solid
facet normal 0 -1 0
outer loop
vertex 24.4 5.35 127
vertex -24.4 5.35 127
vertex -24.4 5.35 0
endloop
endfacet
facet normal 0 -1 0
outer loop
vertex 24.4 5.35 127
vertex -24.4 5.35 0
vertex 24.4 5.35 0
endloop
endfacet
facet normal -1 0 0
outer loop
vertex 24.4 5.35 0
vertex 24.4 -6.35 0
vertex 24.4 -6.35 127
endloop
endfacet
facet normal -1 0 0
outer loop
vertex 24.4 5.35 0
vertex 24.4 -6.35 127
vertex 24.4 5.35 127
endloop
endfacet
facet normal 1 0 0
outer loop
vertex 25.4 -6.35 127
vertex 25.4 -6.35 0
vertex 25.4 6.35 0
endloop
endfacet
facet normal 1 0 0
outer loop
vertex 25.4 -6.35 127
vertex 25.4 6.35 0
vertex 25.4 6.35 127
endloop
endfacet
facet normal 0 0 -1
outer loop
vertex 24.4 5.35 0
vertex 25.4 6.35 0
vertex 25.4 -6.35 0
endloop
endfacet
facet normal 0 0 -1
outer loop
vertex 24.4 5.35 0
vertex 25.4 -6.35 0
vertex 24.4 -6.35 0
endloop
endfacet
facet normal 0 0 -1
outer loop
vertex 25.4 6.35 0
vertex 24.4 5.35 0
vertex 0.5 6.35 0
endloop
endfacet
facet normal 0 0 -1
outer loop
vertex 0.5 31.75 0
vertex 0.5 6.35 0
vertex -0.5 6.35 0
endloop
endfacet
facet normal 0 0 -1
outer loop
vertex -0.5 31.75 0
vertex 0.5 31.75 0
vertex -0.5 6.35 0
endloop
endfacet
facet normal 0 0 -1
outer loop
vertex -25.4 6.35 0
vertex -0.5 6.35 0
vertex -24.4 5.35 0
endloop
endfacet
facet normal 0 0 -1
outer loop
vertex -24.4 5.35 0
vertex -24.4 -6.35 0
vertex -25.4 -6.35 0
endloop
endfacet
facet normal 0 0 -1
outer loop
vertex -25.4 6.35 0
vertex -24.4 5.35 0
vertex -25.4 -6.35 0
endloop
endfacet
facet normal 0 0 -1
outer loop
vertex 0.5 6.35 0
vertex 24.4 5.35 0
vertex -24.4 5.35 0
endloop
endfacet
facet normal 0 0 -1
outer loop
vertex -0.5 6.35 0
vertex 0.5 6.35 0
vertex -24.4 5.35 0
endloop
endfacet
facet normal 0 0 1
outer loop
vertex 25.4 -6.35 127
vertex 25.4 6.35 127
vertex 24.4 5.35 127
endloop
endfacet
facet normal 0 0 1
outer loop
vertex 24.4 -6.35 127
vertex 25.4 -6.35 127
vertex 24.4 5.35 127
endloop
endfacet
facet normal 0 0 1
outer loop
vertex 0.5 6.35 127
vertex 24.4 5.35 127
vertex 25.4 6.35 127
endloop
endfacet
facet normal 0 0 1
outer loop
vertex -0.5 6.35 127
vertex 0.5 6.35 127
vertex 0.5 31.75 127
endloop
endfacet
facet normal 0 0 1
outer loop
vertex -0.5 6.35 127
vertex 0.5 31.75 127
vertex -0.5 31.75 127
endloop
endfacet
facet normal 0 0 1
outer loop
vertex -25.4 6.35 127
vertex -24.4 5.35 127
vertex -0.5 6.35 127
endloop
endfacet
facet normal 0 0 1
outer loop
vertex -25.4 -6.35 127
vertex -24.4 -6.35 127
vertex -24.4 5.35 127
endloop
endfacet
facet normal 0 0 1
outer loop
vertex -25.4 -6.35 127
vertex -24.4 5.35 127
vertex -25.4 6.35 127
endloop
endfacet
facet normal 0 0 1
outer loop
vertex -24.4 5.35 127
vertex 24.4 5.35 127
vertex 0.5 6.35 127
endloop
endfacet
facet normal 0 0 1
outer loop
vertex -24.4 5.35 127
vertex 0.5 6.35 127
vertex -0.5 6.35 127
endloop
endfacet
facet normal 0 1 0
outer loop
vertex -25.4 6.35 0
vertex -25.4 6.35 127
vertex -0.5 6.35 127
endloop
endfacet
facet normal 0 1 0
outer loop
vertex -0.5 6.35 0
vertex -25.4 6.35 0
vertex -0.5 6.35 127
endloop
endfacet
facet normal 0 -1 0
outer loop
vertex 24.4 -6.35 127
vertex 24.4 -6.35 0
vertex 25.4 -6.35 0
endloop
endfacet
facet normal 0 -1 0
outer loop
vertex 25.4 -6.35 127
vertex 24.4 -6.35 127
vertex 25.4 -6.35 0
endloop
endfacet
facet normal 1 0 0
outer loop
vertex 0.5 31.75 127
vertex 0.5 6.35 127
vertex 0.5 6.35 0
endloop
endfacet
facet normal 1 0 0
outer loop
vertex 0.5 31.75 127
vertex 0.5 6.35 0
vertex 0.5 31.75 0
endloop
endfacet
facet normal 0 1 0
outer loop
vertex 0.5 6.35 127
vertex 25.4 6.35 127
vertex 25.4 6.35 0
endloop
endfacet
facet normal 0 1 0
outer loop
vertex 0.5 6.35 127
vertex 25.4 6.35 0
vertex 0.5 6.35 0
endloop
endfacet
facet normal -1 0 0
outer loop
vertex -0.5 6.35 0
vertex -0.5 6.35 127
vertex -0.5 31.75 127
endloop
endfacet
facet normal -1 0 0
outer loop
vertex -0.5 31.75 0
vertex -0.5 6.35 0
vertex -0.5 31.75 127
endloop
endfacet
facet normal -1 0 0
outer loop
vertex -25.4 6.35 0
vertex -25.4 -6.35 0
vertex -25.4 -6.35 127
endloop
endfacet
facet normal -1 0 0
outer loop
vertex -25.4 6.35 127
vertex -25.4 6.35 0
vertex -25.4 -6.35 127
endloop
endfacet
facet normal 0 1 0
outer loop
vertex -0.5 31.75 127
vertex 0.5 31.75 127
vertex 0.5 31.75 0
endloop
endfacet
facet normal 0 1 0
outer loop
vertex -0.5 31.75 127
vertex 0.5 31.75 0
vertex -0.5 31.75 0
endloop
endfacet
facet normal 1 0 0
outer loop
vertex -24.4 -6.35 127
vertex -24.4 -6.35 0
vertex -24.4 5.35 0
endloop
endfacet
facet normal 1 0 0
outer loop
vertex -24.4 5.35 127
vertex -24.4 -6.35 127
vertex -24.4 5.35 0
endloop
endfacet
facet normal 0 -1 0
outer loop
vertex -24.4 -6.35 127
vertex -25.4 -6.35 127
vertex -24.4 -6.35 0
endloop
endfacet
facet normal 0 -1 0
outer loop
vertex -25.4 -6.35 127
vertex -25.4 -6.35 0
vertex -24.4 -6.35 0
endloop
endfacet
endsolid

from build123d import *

# Parameters (mm, degrees)
F0_W     = 50.8
F0_H     = 12.7
F1_DEPTH = 127
F2_T     = -1
F3_W     = 50.8
F3_H     = 127
F4_DEPTH = 25.4
F5_W     = 24.9
F5_H     = 25.4
F6_DEPTH = 127


# Not quite as in the source:
# - a pattern or mirror of a feature is missing from the dataset's text; its kind, count and spacing are read off the source's solid


with BuildPart() as f1:
    # F0 (on Top) → F1 (new body)
    with BuildSketch(Plane.XY):
        Rectangle(F0_W, F0_H)
    extrude(amount=F1_DEPTH)

    # F2
    f2_openings = [f1.faces().sort_by_distance(p)[0] for p in [
        (0, 0, 127),
        (0, -6.35, 63.5),
        (0, 0, 0),
    ]]
    offset(amount=F2_T, openings=f2_openings)

    # F3 (on face) → F4 (join)
    with BuildSketch(Plane(origin=(0, 6.35, 0), x_dir=(-1, 0, 0), z_dir=(0, 1, 0))):
        with Locations((0, 63.5)):
            Rectangle(F3_W, F3_H)
    extrude(amount=F4_DEPTH)

    # F5 (on face) → F6 (cut)
    with BuildSketch(Plane.XY.offset(127)):
        with Locations((-12.95, 19.05)):
            Rectangle(F5_W, F5_H)
    f6 = extrude(amount=-F6_DEPTH, mode=Mode.SUBTRACT)

    # F6_copies: F6 across plane
    add(f6.mirror(Plane(origin=(0, 0, 0), x_dir=(0, 0, 1), z_dir=(1, 0, 0))), mode=Mode.SUBTRACT)


solid = f1.part
